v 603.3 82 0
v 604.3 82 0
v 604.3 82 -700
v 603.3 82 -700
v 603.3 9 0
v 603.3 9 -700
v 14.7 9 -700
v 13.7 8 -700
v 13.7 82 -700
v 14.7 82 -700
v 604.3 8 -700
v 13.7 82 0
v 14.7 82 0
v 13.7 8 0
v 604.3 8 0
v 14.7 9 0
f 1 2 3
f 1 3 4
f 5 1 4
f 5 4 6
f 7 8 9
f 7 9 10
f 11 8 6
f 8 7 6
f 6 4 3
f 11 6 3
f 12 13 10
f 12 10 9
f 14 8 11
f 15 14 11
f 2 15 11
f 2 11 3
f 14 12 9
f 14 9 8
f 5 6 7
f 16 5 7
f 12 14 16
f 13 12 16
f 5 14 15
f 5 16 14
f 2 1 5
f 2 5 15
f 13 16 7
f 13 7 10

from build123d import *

# Parameters (mm, degrees)
CEK_DONMUS_KUTU_U_1_0_1_DEPTH = 700


with BuildPart() as part:
    # Sketch1 → CEK_donmus_kutu_U_1.0_1 (new body)
    with BuildSketch(Plane.XY):
        Polygon((13.7, 82), (13.7, 8), (604.3, 8), (604.3, 82), (603.3, 82), (603.3, 9), (14.7, 9), (14.7, 82), align=None)
    extrude(amount=-CEK_DONMUS_KUTU_U_1_0_1_DEPTH)


solid = part.part
